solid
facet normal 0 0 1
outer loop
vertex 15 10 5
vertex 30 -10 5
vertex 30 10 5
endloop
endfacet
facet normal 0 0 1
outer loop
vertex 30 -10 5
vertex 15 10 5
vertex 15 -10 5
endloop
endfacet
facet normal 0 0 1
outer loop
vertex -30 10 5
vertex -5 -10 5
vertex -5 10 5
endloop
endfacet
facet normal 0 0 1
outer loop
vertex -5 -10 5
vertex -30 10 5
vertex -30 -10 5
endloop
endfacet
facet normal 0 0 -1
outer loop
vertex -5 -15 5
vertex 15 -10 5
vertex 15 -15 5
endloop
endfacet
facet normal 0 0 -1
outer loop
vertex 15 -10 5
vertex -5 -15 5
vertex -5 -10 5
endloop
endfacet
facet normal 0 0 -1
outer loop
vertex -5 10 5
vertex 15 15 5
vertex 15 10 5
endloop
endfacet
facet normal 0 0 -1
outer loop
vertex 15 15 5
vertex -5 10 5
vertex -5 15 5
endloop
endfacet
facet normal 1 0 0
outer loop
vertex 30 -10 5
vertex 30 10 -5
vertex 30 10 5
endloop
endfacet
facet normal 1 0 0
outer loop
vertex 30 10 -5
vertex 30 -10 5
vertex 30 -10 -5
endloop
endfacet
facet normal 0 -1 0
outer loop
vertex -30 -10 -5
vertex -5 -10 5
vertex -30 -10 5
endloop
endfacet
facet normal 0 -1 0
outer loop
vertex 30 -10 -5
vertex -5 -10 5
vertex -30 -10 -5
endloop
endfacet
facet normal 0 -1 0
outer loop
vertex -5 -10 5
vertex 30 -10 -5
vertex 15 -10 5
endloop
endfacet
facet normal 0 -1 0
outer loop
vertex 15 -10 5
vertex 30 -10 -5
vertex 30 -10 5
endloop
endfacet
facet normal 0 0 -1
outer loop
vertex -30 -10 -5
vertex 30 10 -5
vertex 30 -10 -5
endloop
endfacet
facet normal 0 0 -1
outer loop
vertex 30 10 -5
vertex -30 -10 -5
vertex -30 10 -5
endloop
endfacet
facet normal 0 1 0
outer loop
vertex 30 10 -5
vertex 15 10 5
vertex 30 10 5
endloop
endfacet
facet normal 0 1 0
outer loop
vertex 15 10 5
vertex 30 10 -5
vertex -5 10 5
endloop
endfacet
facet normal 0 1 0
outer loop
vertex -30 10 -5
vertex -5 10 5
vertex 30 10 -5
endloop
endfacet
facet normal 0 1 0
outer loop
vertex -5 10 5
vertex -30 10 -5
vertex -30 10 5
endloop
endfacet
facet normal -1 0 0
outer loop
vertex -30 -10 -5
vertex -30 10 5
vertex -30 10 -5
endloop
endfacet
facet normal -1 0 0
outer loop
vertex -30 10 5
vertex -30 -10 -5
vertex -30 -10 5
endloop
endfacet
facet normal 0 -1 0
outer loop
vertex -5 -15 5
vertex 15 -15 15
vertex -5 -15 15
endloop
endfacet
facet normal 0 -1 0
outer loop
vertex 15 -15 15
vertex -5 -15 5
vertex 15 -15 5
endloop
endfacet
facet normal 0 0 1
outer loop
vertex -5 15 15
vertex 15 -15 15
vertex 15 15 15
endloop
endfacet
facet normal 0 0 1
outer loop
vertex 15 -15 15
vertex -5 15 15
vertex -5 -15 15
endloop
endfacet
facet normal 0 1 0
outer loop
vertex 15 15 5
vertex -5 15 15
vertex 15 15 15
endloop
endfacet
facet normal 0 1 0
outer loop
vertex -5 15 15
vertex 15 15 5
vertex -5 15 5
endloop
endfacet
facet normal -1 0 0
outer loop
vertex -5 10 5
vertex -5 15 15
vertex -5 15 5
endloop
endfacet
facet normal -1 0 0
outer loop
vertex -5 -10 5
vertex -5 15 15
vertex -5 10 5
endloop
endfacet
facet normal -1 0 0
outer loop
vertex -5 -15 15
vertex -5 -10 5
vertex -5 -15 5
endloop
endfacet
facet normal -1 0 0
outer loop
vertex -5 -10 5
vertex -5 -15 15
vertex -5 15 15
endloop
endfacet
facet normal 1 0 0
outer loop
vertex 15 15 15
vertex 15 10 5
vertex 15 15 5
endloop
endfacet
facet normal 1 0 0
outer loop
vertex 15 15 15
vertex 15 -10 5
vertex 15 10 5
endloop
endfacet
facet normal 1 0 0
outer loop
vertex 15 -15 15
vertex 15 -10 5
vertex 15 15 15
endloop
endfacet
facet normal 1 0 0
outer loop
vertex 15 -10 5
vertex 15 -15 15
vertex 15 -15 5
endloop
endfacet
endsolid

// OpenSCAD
// Chapter One

// https://openscad.org/documentation.html#tutorial
// https://en.wikibooks.org/wiki/OpenSCAD_Tutorial/Chapter_1

// Ewan Ewart 2021.11.05
//
// transformation rotate

$fa = 1;
$fs = 0.4;

rotate(-180) cube([60,20,10],center=true);
// trasformation translate
translate([5,0,10]) rotate(-90) cube([30,20,10],center=true);
square([30,60],center=true);
